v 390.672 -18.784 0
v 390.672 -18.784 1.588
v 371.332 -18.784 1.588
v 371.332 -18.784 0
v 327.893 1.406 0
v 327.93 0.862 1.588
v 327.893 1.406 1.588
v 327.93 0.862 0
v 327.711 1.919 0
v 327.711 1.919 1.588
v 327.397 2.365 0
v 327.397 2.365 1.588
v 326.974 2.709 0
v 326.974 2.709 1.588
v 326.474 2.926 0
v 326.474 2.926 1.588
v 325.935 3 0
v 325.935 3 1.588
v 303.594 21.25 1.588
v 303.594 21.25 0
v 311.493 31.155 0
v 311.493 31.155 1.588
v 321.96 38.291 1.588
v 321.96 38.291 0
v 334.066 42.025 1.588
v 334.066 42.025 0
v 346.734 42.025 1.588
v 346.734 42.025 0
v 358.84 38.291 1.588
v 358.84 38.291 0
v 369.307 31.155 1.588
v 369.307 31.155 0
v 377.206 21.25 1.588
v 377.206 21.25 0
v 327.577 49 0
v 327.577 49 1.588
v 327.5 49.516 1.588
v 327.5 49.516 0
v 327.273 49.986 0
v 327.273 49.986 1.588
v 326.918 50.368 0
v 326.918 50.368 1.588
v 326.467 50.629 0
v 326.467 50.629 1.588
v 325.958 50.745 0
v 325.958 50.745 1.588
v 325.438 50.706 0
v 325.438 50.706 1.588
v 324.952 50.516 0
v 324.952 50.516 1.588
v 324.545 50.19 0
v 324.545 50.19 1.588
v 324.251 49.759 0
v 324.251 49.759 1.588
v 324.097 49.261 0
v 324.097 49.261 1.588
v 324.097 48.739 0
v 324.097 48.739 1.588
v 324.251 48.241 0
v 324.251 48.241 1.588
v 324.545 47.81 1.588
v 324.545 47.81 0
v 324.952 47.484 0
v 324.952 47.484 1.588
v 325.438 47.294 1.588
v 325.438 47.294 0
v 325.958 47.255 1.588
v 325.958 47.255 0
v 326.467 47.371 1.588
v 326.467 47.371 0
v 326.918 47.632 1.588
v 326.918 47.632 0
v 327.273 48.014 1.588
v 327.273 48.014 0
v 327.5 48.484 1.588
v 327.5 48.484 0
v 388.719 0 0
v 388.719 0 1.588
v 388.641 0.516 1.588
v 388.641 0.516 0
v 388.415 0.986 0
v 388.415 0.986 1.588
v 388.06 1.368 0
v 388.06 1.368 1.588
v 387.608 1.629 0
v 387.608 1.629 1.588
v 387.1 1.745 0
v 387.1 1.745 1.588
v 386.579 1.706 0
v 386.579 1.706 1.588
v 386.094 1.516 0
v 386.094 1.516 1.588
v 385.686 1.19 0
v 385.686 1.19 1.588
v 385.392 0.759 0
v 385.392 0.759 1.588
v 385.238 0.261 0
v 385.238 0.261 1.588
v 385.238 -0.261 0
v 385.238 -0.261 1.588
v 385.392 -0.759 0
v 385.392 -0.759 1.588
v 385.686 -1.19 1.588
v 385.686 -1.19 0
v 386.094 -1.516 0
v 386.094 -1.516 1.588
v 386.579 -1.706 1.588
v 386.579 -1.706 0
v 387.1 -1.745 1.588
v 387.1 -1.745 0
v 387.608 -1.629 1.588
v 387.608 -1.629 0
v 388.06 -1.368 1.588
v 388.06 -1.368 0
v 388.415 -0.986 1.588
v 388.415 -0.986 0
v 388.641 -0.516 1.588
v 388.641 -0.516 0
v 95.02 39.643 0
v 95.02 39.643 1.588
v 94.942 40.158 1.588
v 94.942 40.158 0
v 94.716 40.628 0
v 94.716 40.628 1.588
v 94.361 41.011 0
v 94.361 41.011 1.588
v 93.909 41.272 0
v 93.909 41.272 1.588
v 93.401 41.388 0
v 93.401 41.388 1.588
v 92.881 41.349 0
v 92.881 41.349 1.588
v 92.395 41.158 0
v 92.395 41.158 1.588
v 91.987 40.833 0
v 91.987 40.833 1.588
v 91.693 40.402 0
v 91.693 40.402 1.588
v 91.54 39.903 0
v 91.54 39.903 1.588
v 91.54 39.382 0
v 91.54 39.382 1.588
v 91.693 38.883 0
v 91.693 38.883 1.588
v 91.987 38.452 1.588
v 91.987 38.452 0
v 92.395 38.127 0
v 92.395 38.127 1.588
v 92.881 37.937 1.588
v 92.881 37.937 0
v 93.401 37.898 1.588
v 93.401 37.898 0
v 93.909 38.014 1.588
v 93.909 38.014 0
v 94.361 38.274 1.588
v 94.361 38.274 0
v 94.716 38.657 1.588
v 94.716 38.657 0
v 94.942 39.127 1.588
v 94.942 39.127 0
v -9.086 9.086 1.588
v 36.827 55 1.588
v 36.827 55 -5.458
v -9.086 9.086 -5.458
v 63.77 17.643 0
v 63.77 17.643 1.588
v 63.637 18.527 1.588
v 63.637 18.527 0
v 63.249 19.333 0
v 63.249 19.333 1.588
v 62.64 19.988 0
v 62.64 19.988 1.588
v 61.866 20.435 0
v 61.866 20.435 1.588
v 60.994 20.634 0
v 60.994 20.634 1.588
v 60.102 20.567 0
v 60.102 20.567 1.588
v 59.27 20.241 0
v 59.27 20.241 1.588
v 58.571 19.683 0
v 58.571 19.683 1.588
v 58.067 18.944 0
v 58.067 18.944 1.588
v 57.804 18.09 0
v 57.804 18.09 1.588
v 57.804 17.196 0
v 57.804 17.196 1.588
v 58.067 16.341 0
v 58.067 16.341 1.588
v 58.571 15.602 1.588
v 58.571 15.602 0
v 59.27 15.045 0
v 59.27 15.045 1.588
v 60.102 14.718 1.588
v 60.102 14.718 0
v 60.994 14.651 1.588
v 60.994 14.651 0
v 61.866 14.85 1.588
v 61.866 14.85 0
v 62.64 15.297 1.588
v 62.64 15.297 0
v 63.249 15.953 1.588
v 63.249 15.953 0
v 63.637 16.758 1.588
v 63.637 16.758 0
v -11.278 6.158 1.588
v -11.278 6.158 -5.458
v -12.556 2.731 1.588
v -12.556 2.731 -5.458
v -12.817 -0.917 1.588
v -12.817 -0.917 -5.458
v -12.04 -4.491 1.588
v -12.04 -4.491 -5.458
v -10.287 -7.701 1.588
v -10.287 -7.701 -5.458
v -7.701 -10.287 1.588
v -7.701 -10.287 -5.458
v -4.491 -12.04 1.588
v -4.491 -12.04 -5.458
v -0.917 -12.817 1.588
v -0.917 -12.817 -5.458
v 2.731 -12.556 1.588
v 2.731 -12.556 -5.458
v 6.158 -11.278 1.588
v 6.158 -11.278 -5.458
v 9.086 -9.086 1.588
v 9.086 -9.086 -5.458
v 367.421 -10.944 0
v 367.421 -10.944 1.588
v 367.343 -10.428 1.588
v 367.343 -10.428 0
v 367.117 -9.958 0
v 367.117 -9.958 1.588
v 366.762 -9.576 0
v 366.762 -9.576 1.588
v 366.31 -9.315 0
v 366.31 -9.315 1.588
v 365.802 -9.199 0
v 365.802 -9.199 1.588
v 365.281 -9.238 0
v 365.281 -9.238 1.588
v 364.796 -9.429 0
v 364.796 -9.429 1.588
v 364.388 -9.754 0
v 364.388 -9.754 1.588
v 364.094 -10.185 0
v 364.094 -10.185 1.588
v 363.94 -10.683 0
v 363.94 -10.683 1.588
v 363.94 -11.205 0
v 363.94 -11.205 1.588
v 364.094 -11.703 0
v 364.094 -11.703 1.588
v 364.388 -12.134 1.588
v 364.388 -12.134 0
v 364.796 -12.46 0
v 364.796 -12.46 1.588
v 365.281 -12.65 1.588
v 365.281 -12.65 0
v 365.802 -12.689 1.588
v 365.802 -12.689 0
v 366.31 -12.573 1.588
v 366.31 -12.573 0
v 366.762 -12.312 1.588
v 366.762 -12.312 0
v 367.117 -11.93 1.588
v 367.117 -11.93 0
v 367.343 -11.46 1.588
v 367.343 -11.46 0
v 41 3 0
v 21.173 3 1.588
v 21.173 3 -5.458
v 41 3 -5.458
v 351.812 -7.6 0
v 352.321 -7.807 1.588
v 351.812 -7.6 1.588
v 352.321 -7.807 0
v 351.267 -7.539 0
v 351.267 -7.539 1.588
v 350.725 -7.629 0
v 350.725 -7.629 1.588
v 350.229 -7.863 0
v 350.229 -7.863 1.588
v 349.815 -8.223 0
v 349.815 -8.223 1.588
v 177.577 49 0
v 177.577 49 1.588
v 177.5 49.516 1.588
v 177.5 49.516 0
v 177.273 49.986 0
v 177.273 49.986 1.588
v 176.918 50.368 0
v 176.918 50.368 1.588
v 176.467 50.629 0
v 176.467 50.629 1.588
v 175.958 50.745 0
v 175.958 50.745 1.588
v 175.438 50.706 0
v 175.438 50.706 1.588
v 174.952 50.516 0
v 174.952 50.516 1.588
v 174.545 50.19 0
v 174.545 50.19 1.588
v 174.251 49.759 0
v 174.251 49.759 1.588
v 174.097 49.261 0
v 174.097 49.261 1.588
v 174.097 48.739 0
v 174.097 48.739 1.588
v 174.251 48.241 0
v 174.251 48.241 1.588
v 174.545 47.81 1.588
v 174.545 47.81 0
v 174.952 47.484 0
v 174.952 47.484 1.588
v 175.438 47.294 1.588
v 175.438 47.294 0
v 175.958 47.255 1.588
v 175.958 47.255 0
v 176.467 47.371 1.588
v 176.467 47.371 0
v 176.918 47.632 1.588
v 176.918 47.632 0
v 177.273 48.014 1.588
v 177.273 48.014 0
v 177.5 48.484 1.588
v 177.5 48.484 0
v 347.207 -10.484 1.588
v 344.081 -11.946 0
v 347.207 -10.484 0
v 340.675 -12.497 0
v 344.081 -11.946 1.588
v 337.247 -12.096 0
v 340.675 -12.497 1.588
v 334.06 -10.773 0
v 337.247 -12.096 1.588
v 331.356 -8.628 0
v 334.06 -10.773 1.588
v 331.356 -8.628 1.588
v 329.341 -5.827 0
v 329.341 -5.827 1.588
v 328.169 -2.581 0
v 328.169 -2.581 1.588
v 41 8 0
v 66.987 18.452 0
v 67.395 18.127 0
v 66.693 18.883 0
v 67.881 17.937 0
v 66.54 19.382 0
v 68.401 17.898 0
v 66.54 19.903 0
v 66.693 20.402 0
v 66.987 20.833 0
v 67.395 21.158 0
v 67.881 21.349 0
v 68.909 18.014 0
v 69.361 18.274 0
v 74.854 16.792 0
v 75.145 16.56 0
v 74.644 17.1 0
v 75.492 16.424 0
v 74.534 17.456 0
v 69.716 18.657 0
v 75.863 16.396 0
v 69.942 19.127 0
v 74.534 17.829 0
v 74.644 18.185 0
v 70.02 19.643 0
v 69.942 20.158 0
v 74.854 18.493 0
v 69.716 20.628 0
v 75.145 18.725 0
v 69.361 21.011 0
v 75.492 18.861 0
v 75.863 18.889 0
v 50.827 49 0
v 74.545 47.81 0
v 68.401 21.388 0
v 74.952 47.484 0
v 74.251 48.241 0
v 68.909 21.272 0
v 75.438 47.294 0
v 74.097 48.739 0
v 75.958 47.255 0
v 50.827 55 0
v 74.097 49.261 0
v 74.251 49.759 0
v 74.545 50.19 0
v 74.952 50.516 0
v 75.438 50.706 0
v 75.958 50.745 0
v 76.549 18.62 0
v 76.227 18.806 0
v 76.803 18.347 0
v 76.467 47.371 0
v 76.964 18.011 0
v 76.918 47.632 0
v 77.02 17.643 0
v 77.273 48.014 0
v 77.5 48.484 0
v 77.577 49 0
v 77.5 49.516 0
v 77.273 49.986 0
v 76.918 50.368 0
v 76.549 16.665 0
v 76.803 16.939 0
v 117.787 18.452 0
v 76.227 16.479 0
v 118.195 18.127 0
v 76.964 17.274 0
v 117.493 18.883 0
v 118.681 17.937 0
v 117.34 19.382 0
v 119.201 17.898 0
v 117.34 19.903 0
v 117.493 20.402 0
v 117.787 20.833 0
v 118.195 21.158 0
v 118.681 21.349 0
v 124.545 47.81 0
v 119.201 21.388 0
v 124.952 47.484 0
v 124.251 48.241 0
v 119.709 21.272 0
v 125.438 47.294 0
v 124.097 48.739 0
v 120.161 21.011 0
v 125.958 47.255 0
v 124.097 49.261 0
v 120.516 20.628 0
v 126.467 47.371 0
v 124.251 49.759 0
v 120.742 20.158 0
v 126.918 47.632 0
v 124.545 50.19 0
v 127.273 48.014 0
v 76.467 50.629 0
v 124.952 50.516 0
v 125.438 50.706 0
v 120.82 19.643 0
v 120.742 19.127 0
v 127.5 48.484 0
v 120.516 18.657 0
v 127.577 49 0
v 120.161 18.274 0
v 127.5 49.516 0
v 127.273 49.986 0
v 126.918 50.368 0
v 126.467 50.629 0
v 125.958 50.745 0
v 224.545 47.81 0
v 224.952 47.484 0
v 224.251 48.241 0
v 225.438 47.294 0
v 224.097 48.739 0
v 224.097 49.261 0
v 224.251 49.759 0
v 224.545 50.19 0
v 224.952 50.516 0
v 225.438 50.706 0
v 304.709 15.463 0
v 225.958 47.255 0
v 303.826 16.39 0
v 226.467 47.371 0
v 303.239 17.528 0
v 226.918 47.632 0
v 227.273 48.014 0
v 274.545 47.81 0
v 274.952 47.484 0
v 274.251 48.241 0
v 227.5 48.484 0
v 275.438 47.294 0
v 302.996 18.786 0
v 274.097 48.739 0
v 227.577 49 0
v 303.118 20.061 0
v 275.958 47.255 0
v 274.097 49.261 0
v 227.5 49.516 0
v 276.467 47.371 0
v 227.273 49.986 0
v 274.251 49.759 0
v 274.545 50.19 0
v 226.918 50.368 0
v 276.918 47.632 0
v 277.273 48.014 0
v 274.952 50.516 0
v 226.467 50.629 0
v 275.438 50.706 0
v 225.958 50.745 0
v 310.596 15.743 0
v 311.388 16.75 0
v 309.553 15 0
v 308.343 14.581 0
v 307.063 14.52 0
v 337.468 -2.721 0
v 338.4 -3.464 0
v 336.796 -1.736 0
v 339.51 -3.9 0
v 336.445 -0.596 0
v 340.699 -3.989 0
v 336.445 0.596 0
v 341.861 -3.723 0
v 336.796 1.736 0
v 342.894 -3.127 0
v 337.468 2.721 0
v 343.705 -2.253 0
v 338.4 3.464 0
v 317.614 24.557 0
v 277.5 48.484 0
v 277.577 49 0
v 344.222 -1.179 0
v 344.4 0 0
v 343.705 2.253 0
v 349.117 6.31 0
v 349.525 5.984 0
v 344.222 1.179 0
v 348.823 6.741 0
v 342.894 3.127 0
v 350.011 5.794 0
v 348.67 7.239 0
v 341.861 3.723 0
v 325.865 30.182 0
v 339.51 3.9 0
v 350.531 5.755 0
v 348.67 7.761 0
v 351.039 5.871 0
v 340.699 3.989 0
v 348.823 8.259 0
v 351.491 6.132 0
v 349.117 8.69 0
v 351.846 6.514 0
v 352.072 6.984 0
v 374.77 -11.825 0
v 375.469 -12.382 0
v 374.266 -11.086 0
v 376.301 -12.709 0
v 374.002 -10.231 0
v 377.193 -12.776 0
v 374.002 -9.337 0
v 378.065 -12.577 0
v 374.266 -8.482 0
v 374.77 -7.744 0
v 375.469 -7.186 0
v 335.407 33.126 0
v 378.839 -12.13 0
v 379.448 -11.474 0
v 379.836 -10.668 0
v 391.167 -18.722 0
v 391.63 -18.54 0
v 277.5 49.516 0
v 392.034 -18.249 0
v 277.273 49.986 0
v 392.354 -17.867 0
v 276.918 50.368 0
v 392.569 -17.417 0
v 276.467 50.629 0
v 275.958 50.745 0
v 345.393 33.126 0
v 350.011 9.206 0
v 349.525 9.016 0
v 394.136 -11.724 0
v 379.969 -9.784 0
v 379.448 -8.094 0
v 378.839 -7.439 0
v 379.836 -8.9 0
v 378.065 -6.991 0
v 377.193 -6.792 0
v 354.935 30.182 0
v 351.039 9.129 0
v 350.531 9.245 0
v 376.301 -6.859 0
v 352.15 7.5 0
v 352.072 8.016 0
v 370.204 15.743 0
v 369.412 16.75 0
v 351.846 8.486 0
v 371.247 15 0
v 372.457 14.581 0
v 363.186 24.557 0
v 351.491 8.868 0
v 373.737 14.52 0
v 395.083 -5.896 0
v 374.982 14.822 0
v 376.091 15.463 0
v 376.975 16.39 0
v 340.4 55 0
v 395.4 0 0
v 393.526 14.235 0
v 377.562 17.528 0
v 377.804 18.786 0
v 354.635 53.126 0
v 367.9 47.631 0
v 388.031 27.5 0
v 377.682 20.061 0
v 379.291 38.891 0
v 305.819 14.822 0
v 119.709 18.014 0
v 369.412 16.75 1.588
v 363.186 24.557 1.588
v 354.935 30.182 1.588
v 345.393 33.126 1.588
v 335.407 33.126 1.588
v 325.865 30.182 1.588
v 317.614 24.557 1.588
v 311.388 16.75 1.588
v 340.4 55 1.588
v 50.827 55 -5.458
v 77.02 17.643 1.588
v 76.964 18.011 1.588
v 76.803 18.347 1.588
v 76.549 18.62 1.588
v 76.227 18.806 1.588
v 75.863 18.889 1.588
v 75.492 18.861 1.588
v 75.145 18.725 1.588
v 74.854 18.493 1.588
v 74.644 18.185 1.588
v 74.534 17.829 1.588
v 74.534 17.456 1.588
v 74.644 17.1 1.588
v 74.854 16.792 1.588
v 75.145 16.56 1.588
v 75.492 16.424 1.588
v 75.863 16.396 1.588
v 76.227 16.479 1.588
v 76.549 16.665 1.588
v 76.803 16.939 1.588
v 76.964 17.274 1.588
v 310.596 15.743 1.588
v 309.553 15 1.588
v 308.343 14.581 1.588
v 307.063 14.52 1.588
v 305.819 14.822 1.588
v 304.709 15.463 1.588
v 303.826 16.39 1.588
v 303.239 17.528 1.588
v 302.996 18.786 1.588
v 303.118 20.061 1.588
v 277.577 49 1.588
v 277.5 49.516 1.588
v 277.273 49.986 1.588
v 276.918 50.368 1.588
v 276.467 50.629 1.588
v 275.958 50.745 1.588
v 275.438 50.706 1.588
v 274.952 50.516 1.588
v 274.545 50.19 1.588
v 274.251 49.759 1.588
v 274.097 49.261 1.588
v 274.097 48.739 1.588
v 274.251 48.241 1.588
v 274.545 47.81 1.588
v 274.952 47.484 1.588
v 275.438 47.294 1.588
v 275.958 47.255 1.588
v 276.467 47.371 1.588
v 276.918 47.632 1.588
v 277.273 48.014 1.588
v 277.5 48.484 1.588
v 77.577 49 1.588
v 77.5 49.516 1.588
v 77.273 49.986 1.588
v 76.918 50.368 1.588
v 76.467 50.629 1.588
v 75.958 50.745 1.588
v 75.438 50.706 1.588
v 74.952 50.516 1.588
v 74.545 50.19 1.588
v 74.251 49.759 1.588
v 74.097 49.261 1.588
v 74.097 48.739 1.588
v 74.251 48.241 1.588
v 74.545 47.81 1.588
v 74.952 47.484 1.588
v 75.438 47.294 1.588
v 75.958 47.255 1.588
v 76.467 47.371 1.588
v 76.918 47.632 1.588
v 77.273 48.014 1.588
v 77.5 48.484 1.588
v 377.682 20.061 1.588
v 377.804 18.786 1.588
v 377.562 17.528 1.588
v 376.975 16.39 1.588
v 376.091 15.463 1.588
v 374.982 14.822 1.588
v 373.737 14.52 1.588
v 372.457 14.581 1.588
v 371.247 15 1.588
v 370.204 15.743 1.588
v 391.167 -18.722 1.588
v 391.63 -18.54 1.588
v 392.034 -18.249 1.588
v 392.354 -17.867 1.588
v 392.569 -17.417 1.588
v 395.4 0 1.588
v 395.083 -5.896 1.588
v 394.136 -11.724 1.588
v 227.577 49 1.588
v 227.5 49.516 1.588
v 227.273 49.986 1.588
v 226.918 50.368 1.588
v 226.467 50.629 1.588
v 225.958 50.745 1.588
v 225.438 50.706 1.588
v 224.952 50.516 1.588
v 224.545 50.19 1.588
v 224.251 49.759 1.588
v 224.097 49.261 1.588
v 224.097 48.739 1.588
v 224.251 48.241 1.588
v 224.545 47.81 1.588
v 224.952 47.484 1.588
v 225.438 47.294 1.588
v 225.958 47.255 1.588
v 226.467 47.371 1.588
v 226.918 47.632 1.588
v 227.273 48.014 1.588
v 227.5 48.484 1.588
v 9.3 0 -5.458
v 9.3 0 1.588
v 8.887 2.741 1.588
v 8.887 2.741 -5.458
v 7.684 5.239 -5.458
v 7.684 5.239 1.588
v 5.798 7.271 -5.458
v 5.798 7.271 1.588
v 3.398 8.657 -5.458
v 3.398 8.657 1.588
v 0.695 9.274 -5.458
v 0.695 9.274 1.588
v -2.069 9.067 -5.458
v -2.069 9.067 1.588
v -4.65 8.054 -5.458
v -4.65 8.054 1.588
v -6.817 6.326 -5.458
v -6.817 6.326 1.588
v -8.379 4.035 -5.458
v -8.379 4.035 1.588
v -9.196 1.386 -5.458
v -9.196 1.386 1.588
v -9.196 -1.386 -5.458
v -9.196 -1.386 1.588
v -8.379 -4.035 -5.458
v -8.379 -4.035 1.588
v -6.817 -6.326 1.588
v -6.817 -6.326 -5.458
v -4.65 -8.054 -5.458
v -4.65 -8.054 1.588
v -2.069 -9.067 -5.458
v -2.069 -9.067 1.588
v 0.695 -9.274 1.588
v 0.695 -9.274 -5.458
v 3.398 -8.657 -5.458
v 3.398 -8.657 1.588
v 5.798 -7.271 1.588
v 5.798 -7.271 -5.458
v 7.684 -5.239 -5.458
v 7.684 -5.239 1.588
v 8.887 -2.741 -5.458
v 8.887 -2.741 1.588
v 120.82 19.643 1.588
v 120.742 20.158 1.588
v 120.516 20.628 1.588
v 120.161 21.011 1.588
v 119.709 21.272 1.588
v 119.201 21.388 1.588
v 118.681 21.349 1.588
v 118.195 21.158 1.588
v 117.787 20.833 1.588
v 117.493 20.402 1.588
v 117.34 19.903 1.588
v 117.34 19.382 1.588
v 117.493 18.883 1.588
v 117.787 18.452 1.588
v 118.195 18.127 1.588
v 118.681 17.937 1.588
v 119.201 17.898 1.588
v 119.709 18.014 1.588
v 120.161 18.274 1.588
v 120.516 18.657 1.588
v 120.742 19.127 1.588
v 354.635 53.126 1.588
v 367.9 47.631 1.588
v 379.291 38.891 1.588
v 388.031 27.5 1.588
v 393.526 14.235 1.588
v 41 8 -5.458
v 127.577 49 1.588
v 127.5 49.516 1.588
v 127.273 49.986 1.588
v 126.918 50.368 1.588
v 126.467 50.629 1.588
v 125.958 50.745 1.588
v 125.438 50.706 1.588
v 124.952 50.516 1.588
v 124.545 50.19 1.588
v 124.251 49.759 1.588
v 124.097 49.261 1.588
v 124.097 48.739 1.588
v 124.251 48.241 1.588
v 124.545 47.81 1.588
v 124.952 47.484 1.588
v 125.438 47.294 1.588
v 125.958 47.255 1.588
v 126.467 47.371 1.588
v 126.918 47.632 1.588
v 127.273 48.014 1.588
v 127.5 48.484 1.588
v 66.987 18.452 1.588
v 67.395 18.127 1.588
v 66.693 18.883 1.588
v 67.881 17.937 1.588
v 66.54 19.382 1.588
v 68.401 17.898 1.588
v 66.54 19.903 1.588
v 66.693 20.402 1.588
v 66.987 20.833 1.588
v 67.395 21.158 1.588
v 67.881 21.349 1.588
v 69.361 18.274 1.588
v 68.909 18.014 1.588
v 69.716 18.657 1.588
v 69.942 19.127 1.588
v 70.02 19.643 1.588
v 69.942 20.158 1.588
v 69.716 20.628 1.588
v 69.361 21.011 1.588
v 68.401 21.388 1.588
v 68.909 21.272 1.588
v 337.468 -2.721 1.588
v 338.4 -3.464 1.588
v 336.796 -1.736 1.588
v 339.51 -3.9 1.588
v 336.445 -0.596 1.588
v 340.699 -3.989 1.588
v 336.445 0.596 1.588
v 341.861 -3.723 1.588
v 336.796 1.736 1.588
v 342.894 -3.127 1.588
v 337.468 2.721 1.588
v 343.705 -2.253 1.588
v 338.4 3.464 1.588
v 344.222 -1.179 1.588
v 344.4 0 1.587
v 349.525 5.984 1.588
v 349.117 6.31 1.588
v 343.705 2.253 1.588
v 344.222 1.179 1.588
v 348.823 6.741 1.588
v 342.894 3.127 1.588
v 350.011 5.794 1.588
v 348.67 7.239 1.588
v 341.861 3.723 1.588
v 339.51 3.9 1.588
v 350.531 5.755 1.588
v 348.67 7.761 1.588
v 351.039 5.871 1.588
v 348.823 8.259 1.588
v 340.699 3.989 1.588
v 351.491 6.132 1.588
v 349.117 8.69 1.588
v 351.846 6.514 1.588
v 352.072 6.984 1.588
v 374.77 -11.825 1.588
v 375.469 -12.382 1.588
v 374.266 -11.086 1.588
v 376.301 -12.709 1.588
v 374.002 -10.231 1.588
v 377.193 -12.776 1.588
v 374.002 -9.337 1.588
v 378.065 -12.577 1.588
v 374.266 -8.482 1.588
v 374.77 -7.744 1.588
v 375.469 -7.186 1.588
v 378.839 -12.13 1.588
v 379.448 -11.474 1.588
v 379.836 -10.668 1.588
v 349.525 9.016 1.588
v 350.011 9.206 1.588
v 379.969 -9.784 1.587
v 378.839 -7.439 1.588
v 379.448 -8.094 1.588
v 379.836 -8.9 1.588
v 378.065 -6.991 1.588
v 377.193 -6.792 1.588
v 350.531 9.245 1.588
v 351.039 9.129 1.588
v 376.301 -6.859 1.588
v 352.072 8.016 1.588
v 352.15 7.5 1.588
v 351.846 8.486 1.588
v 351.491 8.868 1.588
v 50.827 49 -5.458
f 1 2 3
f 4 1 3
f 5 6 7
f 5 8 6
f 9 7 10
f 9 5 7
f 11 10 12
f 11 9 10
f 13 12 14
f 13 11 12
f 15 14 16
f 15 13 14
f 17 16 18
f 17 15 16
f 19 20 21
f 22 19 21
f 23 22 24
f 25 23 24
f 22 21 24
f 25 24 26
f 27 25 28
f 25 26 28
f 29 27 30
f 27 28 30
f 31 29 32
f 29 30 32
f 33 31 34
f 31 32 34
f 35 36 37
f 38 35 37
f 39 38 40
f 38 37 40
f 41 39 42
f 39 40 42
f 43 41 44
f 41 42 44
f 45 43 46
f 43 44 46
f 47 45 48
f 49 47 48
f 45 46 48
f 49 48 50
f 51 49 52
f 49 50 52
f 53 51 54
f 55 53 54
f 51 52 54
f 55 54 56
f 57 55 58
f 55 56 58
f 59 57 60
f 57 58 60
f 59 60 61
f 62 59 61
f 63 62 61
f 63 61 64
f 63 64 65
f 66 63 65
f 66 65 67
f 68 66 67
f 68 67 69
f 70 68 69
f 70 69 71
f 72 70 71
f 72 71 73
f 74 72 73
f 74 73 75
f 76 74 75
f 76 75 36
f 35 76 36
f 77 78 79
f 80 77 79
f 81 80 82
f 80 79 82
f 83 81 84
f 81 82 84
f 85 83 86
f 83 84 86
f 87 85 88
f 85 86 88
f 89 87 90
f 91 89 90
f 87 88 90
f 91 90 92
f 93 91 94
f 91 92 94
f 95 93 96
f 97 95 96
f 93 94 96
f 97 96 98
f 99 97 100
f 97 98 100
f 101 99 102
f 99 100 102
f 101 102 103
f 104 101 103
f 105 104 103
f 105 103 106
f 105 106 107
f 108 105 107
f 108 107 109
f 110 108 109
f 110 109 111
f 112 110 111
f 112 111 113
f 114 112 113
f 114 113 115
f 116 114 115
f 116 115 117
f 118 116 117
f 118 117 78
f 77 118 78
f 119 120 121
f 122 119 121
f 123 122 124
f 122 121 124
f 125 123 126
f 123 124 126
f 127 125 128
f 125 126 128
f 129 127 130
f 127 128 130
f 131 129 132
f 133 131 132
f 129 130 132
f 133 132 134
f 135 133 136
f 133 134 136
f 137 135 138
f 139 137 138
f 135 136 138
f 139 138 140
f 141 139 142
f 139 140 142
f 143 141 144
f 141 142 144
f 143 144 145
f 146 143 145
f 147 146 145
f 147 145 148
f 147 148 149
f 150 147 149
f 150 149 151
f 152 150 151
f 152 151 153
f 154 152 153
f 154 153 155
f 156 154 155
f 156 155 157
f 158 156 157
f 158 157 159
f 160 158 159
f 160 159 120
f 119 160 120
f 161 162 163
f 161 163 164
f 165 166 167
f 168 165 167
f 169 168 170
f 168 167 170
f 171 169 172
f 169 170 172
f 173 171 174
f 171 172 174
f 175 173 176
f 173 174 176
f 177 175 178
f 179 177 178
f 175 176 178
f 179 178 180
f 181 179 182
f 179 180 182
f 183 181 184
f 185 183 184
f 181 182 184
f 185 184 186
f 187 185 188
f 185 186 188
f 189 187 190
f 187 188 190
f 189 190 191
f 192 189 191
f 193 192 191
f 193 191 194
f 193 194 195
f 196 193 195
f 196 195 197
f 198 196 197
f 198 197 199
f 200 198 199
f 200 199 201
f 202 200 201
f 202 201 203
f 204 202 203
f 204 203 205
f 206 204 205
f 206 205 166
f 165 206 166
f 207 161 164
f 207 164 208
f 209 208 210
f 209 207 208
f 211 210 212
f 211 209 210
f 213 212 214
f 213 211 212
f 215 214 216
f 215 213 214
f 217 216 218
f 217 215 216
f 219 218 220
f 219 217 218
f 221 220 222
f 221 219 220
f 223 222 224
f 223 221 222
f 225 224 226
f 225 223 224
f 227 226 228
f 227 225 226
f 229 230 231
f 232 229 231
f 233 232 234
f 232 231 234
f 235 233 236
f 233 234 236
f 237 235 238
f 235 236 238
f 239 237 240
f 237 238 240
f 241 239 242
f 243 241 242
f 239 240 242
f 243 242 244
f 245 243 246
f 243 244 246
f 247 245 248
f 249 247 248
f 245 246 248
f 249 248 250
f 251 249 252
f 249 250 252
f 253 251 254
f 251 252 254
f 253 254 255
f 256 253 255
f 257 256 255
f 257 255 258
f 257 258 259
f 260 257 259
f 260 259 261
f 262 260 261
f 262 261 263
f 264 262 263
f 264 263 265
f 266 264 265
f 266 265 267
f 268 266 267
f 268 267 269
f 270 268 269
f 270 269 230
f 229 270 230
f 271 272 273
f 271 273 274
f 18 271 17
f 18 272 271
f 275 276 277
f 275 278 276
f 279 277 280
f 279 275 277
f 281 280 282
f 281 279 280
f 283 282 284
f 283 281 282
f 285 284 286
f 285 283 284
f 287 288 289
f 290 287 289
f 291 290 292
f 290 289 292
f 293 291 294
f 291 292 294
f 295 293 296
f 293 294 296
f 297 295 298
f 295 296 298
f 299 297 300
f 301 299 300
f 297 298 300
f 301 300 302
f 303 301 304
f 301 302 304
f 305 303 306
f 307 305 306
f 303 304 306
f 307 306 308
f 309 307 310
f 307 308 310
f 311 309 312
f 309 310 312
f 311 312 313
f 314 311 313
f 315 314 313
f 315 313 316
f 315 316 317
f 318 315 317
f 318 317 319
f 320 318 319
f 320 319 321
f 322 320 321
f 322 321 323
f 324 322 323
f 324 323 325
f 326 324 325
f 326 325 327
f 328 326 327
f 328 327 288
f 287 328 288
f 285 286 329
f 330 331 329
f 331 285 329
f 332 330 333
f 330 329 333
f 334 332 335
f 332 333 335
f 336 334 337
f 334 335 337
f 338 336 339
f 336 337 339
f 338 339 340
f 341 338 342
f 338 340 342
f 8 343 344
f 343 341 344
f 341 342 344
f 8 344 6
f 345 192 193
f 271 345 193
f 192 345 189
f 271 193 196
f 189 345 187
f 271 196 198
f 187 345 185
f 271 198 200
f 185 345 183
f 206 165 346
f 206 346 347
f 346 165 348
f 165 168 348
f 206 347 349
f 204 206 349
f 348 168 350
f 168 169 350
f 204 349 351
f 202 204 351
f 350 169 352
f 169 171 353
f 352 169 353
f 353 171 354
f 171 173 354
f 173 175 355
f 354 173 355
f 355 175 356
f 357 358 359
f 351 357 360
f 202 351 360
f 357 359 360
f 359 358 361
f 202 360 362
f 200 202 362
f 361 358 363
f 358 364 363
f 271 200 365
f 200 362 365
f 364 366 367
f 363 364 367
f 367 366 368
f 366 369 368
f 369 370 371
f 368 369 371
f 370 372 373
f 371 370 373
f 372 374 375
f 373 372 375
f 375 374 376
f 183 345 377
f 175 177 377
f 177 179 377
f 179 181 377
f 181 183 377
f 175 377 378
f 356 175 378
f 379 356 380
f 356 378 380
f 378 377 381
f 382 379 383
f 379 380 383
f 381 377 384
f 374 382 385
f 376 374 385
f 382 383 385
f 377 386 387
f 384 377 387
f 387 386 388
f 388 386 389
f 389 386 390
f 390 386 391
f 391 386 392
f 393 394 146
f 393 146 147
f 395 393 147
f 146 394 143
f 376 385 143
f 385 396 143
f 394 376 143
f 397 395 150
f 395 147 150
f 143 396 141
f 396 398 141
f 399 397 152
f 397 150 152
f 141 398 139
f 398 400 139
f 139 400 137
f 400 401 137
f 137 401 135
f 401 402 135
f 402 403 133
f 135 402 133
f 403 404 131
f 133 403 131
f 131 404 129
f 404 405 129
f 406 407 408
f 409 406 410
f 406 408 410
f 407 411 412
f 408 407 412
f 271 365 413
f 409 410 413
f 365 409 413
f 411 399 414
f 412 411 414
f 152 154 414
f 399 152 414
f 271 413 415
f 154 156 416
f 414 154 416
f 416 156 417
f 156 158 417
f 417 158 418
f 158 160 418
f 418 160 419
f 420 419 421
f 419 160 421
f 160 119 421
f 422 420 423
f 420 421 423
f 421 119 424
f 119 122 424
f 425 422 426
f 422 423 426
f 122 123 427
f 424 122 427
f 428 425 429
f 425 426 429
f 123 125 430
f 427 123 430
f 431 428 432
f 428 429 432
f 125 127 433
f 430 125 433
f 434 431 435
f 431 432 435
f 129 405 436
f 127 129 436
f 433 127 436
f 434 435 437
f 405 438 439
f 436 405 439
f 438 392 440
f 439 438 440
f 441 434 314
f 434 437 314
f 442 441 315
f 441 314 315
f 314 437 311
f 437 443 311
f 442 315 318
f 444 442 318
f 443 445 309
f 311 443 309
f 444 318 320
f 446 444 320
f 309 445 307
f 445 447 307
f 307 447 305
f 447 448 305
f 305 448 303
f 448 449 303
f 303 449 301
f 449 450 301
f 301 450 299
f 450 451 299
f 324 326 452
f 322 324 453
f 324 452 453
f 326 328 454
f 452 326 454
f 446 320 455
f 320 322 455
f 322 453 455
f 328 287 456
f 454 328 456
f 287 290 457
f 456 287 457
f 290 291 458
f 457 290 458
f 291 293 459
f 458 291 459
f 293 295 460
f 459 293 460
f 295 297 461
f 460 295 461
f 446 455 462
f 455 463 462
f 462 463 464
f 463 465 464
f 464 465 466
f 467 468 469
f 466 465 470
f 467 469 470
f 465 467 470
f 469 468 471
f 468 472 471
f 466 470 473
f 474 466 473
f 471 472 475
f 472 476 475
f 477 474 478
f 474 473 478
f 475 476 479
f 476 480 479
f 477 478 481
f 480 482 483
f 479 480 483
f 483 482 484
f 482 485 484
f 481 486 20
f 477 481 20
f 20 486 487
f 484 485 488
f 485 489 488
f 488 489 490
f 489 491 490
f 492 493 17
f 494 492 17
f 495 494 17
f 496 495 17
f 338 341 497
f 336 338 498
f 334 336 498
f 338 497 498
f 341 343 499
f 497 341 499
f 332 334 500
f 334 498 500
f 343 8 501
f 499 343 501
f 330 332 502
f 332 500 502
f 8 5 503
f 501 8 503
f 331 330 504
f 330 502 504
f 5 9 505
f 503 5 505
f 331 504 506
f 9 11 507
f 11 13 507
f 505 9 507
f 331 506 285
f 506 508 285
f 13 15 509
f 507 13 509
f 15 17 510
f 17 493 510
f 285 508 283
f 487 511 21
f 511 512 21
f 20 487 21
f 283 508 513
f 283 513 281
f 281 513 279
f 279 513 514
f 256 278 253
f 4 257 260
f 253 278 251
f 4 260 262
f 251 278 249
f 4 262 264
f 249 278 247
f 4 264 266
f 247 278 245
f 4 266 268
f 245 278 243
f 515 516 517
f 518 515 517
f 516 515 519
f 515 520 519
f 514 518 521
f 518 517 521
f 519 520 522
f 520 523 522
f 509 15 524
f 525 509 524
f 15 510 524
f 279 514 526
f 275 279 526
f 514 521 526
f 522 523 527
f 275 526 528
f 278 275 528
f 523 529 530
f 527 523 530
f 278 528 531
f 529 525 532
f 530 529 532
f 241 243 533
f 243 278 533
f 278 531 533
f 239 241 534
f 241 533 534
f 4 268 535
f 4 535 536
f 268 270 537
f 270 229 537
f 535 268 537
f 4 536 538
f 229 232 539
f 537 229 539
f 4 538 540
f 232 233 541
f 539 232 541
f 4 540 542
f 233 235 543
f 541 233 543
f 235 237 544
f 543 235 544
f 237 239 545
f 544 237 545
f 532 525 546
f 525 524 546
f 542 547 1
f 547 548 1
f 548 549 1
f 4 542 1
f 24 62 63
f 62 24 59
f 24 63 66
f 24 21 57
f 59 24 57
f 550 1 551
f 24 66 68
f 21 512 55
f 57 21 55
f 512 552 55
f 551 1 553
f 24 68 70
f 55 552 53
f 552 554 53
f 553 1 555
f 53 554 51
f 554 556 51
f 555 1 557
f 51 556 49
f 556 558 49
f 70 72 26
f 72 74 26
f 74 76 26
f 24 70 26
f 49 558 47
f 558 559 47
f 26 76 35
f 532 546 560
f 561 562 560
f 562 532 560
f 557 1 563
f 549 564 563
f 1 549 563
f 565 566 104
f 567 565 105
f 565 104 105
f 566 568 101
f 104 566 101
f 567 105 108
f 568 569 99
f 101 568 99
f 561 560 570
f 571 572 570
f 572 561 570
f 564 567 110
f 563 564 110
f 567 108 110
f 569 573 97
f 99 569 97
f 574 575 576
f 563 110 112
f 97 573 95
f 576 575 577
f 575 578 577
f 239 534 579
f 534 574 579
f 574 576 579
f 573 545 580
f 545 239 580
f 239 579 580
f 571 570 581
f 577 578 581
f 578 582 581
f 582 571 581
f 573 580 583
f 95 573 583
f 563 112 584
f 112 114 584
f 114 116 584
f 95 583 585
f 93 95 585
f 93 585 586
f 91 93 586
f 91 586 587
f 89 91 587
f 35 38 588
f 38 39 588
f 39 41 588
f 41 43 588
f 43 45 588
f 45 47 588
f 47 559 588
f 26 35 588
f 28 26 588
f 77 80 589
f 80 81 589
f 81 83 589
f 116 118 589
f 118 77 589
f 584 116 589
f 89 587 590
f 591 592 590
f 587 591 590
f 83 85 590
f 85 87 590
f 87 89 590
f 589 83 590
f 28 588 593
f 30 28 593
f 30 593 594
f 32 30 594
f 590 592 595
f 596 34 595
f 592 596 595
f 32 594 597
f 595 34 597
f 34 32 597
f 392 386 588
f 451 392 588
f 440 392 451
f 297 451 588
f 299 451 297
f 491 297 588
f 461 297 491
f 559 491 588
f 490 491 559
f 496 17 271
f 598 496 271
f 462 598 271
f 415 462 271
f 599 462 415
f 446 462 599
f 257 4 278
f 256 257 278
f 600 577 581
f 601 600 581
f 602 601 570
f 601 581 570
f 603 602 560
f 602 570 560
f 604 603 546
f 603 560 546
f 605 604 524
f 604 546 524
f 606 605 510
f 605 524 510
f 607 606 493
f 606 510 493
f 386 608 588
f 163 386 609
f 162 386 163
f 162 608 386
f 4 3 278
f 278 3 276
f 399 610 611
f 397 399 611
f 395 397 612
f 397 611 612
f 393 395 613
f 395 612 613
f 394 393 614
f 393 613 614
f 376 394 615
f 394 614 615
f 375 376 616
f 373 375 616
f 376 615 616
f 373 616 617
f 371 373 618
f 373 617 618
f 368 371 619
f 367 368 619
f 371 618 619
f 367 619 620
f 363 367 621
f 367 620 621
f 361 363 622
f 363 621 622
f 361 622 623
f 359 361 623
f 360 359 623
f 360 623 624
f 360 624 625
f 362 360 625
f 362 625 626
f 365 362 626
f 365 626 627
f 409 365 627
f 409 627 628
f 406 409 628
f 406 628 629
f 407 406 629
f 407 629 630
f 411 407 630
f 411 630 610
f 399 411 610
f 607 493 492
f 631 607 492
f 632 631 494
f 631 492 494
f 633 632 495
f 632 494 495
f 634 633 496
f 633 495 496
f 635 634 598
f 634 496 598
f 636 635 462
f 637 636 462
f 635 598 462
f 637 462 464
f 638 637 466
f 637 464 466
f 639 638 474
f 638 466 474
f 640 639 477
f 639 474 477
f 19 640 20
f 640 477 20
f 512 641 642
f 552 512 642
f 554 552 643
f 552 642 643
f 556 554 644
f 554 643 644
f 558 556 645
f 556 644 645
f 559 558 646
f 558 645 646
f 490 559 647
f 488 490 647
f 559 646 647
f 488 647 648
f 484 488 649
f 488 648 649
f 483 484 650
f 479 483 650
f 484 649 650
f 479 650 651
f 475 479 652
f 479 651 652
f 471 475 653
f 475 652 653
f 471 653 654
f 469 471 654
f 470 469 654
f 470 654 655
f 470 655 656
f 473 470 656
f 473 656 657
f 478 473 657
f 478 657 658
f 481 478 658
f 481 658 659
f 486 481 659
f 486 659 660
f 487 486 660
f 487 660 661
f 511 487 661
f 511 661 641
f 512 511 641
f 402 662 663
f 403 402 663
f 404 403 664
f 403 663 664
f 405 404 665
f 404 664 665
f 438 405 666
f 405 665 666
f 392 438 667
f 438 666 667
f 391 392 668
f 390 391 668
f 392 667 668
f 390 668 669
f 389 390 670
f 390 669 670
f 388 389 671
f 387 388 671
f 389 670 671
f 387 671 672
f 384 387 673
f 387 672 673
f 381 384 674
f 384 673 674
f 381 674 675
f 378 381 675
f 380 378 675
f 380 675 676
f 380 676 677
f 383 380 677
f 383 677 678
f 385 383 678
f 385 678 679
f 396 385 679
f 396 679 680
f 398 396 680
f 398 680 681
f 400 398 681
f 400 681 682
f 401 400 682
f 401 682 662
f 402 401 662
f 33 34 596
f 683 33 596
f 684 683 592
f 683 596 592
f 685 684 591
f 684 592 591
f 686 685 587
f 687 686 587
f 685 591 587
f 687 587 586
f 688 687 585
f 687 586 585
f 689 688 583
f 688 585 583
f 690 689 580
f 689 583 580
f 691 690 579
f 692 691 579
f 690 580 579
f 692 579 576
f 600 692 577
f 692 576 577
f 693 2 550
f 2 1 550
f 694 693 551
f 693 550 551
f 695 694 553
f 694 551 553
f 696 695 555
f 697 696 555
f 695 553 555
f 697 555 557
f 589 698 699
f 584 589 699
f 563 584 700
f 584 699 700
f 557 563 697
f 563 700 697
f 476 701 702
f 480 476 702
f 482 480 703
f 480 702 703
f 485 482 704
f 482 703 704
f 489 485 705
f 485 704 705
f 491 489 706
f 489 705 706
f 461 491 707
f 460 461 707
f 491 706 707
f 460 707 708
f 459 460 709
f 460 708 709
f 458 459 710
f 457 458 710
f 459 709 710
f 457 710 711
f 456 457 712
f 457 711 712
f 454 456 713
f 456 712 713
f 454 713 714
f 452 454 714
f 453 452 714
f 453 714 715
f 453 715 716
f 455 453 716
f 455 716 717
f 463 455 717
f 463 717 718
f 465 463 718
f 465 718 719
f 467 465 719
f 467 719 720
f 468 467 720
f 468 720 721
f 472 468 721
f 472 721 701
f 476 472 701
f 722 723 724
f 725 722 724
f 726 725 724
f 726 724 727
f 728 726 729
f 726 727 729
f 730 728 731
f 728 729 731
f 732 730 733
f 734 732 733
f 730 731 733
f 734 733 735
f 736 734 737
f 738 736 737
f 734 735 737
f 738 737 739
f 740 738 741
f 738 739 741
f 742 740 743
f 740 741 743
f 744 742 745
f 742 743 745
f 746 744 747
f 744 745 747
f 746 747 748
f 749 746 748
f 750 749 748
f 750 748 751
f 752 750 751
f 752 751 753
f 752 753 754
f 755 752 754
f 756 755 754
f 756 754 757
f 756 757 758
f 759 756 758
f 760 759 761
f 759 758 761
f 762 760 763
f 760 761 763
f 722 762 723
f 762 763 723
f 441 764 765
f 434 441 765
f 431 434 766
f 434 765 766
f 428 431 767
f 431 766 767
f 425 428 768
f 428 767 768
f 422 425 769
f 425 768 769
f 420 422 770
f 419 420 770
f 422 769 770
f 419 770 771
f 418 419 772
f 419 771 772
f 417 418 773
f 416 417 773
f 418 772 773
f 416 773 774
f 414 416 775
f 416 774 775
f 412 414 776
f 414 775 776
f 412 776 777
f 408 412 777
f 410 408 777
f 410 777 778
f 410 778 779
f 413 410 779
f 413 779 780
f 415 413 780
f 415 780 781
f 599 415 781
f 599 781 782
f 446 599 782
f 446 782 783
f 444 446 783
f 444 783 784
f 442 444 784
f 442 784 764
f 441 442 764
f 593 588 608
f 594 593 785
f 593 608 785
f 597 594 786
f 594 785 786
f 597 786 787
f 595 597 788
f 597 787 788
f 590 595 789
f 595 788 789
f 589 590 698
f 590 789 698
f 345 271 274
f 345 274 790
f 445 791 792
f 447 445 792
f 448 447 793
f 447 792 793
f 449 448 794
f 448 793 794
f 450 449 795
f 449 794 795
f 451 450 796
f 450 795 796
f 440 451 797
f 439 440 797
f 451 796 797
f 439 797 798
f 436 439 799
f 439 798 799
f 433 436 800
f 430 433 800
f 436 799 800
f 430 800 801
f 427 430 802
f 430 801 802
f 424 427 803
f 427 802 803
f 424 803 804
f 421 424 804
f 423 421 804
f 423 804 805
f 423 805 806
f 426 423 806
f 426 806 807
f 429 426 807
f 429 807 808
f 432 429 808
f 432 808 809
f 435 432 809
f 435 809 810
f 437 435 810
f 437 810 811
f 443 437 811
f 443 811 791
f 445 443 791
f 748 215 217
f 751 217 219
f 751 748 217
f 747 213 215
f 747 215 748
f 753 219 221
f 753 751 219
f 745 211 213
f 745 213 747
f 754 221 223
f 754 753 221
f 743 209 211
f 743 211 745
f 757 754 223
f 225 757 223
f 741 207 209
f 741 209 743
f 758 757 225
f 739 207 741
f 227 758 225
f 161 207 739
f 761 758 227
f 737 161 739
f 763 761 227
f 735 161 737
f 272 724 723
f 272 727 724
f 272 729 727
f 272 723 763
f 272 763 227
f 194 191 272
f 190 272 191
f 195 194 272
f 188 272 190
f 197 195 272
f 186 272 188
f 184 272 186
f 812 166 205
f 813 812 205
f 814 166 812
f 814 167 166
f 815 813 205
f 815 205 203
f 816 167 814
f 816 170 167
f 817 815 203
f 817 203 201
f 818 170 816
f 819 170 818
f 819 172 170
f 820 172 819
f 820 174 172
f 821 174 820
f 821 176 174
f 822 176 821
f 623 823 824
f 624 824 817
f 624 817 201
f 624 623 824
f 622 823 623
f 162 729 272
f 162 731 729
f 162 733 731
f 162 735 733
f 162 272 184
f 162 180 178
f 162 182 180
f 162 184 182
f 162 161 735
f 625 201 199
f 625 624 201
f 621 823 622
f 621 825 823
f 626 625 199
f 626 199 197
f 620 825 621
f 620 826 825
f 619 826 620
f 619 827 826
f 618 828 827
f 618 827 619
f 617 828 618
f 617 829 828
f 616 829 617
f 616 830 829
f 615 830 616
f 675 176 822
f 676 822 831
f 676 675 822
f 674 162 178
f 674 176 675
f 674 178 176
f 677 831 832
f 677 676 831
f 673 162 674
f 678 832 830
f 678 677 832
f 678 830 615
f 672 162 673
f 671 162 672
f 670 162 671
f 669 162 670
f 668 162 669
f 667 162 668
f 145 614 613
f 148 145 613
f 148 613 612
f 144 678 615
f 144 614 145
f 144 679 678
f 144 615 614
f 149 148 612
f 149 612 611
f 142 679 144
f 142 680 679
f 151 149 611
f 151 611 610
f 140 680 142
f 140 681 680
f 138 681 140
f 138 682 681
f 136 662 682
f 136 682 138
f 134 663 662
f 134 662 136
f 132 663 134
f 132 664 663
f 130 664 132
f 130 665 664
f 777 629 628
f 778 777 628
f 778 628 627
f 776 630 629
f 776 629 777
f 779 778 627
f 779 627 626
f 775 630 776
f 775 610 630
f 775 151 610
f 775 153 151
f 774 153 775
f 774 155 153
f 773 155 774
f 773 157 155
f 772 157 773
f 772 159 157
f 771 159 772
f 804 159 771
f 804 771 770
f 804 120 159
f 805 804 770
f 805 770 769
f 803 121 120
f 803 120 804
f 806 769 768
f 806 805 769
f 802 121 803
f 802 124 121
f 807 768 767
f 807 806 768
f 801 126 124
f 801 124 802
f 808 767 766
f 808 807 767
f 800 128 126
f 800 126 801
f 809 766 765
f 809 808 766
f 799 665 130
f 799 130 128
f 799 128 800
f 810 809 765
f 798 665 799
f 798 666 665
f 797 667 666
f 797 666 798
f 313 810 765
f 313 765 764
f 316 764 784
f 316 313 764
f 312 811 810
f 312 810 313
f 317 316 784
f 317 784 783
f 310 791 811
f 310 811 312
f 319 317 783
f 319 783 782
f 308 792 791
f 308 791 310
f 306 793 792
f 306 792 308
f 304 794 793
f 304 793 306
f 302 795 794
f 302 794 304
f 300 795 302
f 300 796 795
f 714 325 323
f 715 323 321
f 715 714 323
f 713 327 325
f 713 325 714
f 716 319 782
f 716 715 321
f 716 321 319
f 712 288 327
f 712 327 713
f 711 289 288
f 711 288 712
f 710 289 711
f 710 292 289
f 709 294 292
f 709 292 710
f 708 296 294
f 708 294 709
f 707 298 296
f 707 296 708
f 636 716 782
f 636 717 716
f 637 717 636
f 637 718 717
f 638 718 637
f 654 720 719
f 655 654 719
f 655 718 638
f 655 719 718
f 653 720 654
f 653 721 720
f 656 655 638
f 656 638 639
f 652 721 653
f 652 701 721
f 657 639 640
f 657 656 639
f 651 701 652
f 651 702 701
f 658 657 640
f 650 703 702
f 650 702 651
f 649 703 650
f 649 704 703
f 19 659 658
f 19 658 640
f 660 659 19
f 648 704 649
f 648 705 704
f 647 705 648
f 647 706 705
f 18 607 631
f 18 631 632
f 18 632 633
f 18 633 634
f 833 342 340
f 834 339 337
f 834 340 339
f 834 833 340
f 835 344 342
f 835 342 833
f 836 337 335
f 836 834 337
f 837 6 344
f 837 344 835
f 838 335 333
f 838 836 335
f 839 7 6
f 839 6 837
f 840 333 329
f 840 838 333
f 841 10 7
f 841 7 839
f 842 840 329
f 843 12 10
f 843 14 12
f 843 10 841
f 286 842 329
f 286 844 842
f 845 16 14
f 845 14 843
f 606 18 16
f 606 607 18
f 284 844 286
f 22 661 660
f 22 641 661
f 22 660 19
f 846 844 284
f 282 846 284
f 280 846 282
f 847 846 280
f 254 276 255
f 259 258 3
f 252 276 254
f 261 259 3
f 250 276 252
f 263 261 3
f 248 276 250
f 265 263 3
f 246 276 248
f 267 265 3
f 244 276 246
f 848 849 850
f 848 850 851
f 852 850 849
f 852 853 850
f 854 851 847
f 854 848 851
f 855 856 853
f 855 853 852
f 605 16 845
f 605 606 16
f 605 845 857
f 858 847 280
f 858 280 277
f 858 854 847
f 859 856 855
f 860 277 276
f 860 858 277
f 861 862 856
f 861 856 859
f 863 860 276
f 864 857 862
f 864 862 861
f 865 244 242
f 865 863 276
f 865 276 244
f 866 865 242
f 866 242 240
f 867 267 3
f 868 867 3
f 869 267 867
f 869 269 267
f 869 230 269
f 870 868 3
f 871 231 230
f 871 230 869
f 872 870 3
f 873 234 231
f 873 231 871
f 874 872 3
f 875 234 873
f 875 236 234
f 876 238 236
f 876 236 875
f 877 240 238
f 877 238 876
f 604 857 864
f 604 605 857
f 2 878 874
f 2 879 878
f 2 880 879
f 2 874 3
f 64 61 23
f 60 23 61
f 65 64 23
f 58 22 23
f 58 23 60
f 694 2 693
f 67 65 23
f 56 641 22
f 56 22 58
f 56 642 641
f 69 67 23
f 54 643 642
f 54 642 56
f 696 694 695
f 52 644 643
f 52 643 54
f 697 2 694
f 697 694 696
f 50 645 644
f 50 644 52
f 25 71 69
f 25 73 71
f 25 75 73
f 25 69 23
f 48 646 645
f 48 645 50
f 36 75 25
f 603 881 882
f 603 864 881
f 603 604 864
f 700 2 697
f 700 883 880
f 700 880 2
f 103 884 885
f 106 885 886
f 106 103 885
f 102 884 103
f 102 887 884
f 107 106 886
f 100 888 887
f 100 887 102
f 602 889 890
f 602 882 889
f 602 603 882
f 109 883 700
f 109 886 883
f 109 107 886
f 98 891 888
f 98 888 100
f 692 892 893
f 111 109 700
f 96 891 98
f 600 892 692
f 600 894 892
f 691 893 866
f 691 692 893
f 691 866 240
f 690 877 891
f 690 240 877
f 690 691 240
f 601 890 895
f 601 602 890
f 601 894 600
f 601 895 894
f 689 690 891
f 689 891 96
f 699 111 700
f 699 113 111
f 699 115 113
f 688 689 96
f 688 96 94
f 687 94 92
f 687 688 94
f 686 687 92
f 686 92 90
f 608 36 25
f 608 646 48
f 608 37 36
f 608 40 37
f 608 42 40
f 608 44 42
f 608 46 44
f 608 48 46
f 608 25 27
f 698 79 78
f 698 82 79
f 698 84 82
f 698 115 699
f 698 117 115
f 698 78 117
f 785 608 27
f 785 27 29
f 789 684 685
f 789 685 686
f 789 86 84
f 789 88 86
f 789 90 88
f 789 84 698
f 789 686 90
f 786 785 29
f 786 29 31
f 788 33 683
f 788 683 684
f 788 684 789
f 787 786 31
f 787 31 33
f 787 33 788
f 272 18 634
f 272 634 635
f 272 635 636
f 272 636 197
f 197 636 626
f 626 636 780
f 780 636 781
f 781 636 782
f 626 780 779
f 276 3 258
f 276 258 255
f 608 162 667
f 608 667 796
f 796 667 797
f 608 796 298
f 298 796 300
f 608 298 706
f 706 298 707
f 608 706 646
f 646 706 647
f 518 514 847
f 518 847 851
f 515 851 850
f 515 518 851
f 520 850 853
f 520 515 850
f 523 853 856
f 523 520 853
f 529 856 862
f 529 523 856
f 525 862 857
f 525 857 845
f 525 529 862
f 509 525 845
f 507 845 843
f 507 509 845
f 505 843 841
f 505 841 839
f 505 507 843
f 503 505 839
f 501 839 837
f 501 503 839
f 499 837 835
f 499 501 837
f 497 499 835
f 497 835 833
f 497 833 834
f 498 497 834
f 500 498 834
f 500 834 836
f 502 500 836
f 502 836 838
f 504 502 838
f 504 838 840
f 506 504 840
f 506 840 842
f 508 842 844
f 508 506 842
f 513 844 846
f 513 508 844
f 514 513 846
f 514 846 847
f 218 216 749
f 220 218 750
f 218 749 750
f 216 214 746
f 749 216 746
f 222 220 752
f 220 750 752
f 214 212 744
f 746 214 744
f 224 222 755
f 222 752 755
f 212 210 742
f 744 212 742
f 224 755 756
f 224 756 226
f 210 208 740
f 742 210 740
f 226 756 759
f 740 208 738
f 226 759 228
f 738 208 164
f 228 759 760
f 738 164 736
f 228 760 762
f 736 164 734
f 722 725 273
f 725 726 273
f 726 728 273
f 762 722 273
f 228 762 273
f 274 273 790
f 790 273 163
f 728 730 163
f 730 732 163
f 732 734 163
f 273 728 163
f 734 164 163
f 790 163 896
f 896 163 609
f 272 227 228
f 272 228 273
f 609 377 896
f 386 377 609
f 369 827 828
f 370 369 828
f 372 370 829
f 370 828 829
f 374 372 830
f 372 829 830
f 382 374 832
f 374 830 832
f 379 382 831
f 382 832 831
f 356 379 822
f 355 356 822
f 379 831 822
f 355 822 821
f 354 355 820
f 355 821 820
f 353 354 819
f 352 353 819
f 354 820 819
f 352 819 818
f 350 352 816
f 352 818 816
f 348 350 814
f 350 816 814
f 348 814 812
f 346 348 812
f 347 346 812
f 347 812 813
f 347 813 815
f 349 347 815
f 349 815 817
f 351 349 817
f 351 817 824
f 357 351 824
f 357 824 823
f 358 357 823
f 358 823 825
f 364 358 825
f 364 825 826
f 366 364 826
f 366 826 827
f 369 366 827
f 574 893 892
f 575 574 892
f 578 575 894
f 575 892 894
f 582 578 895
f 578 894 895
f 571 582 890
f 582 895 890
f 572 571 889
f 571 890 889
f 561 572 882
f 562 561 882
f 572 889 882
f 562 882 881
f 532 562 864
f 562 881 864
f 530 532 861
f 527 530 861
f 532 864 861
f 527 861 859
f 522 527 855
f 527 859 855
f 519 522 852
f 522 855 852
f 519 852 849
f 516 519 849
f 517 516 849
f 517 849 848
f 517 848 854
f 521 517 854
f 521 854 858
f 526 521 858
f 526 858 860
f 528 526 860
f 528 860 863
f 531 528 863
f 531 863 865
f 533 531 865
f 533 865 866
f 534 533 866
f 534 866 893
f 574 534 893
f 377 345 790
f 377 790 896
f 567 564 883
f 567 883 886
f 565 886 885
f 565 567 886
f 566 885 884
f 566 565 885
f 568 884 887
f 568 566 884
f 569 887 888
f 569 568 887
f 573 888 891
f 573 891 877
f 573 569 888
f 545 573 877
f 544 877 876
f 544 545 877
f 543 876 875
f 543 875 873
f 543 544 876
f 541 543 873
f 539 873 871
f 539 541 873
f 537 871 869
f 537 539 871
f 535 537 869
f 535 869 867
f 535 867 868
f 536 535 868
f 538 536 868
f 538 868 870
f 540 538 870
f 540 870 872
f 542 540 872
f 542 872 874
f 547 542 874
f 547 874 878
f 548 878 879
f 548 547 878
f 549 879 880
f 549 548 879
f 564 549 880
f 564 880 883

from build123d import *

# Parameters (mm, degrees)
SKETCH1_W           = 500
SKETCH1_H           = 150
SKETCH1_R           = 9.3
SKETCH1_R_2         = 3
SKETCH1_R_3         = 4
BOSS_EXTRUDE1_DEPTH = 1.5875
SKETCH3_W           = 500
SKETCH3_H           = 150
CUT_EXTRUDE1_DEPTH  = 7
SKETCH4_R           = 9.3
CUT_EXTRUDE2_DEPTH  = 10
FILLET1_R           = 2
SKETCH5_R           = 1.75
SKETCH5_R_2         = 1.25
SKETCH5_R_3         = 3
CUT_EXTRUDE3_DEPTH  = 10
CUT_EXTRUDE4_START  = -10
SKETCH6_R           = 4
SKETCH6_R_2         = 3
SKETCH6_R_3         = 1.75
CUT_EXTRUDE4_DEPTH  = 10
SKETCH7_R           = 1.75
CUT_EXTRUDE5_DEPTH  = 246.38
SKETCH4_3_R         = 9.3
BOSS_EXTRUDE2_DEPTH = 7.045


with BuildPart() as part:
    # Sketch1 → Boss-Extrude1 (new body)
    with BuildSketch(Plane.XY):
        with Locations((200, 0)):
            Rectangle(SKETCH1_W, SKETCH1_H)
        Circle(SKETCH1_R, mode=Mode.SUBTRACT)
        with BuildLine():
            ThreePointArc((303.594020264, 21.24999987), (340.400100069, 42.5), (377.206179805, 21.249999751))
            ThreePointArc((377.206179805, 21.249999751), (375.559064779, 15.102885357), (369.411950518, 16.750000881))
            ThreePointArc((369.411950518, 16.750000881), (340.40010055, 33.5), (311.388250032, 16.750001833))
            ThreePointArc((311.388250032, 16.750001833), (305.241135638, 15.102885116), (303.594020264, 21.24999987))
        make_face(mode=Mode.SUBTRACT)
        with Locations((376.9688, -9.7841)):
            Circle(SKETCH1_R_2, mode=Mode.SUBTRACT)
        with Locations((340.4001, 0)):
            Circle(SKETCH1_R_3, mode=Mode.SUBTRACT)
    extrude(amount=BOSS_EXTRUDE1_DEPTH)

    # Sketch3 → Cut-Extrude1 (cut)
    with BuildSketch(Plane.XY.offset(1.5875)):
        with Locations((200, 0)):
            Rectangle(SKETCH3_W, SKETCH3_H)
        with BuildLine():
            Line((36.827355724, 55), (340.4001, 55))
            ThreePointArc((340.4001, 55), (385.445219047, 31.558473506), (392.093016219, -18.7841))
            Line((392.093016219, -18.7841), (371.332419214, -18.7841))
            Line((371.332419214, -18.7841), (350.803013897, -6.930323401))
            ThreePointArc((350.803013897, -6.930323401), (335.360003988, -11.438856245), (328.2654389, 3))
            Line((328.2654389, 3), (21.172644276, 3))
            Line((21.172644276, 3), (9.086322138, -9.086322138))
            ThreePointArc((9.086322138, -9.086322138), (-9.086322138, -9.086322138), (-9.086322138, 9.086322138))
            Line((-9.086322138, 9.086322138), (36.827355724, 55))
        make_face(mode=Mode.SUBTRACT)
    extrude(amount=-CUT_EXTRUDE1_DEPTH, mode=Mode.SUBTRACT)

    # Sketch4 → Cut-Extrude2 (cut)
    # profile 1 of 2: a face of its own
    with BuildSketch(Plane.XY.offset(1.5875)):
        Polygon((36.827355724, 55), (30.827355724, 49), (50.827355724, 49), (50.827355724, 55), align=None)
    # profile 2 of 2: a face of its own
    with BuildSketch(Plane.XY.offset(1.5875)):
        with BuildLine():
            Line((23.112698372, 8), (6.470027048, 24.642671324))
            Line((6.470027048, 24.642671324), (-9.086322138, 9.086322138))
            ThreePointArc((-9.086322138, 9.086322138), (-9.086322138, -9.086322138), (9.086322138, -9.086322138))
            Line((9.086322138, -9.086322138), (21.172644276, 3))
            Line((21.172644276, 3), (41, 3))
            Line((41, 3), (41, 8))
            Line((41, 8), (23.112698372, 8))
        make_face()
        Circle(SKETCH4_R, mode=Mode.SUBTRACT)
    extrude(amount=-CUT_EXTRUDE2_DEPTH, mode=Mode.SUBTRACT)

    # Fillet1
    fillet1_edges = [part.edges().sort_by_distance(p)[0] for p in [
        (392.093016219, -18.7841, 0.79375),
        (328.2654389, 3, 0.79375),
        (350.803013897, -6.930323401, 0.79375),
    ]]
    fillet(fillet1_edges, radius=FILLET1_R)

    # Sketch5 → Cut-Extrude3 (cut)
    with BuildSketch(Plane.XY.offset(1.5875)):
        with Locations((17.470027048, 19.642671324)):
            Circle(SKETCH5_R)
        with Locations((42.470027048, 39.642671324)):
            Circle(SKETCH5_R)
        with Locations((93.270027048, 39.642671324)):
            Circle(SKETCH5_R)
        with Locations((68.270027048, 19.642671324)):
            Circle(SKETCH5_R)
        with Locations((119.070027048, 19.642671324)):
            Circle(SKETCH5_R)
        with Locations((75.770027048, 17.642671324)):
            Circle(SKETCH5_R_2)
        with Locations((60.770027048, 17.642671324)):
            Circle(SKETCH5_R_3)
    extrude(amount=-CUT_EXTRUDE3_DEPTH, mode=Mode.SUBTRACT)

    # Sketch6 → Cut-Extrude4 (cut)
    with BuildSketch(Plane.XY.offset(1.5875).offset(CUT_EXTRUDE4_START)):
        with Locations((340.4001, 0)):
            Circle(SKETCH6_R)
        with Locations((376.9688, -9.7841)):
            Circle(SKETCH6_R_2)
        with Locations((350.4001, 7.5)):
            Circle(SKETCH6_R_3)
        with Locations((386.9688, 0)):
            Circle(SKETCH6_R_3)
        with Locations((365.670778247, -10.944141097)):
            Circle(SKETCH6_R_3)
    extrude(amount=CUT_EXTRUDE4_DEPTH, mode=Mode.SUBTRACT)

    # Sketch7 → Cut-Extrude5 (cut)
    with BuildSketch(Plane.XY.offset(1.5875)):
        with Locations((75.827355724, 49)):
            Circle(SKETCH7_R)
        with Locations((125.827355724, 49)):
            Circle(SKETCH7_R)
        with Locations((175.827355724, 49)):
            Circle(SKETCH7_R)
        with Locations((225.827355724, 49)):
            Circle(SKETCH7_R)
        with Locations((275.827355724, 49)):
            Circle(SKETCH7_R)
        with Locations((325.827355724, 49)):
            Circle(SKETCH7_R)
    extrude(amount=-CUT_EXTRUDE5_DEPTH, mode=Mode.SUBTRACT)

    # Sketch4<3> → Boss-Extrude2 (add)
    with BuildSketch(Plane.XY.offset(1.5875)):
        with BuildLine():
            Line((41, 8), (50.827355724, 49))
            Line((50.827355724, 49), (50.827355724, 55))
            Line((50.827355724, 55), (36.827355724, 55))
            Line((36.827355724, 55), (-9.086322138, 9.086322138))
            ThreePointArc((-9.086322138, 9.086322138), (-9.086322138, -9.086322138), (9.086322138, -9.086322138))
            Line((9.086322138, -9.086322138), (21.172644276, 3))
            Line((21.172644276, 3), (41, 3))
            Line((41, 3), (41, 8))
        make_face()
        Circle(SKETCH4_3_R, mode=Mode.SUBTRACT)
    extrude(amount=-BOSS_EXTRUDE2_DEPTH)


solid = part.part
